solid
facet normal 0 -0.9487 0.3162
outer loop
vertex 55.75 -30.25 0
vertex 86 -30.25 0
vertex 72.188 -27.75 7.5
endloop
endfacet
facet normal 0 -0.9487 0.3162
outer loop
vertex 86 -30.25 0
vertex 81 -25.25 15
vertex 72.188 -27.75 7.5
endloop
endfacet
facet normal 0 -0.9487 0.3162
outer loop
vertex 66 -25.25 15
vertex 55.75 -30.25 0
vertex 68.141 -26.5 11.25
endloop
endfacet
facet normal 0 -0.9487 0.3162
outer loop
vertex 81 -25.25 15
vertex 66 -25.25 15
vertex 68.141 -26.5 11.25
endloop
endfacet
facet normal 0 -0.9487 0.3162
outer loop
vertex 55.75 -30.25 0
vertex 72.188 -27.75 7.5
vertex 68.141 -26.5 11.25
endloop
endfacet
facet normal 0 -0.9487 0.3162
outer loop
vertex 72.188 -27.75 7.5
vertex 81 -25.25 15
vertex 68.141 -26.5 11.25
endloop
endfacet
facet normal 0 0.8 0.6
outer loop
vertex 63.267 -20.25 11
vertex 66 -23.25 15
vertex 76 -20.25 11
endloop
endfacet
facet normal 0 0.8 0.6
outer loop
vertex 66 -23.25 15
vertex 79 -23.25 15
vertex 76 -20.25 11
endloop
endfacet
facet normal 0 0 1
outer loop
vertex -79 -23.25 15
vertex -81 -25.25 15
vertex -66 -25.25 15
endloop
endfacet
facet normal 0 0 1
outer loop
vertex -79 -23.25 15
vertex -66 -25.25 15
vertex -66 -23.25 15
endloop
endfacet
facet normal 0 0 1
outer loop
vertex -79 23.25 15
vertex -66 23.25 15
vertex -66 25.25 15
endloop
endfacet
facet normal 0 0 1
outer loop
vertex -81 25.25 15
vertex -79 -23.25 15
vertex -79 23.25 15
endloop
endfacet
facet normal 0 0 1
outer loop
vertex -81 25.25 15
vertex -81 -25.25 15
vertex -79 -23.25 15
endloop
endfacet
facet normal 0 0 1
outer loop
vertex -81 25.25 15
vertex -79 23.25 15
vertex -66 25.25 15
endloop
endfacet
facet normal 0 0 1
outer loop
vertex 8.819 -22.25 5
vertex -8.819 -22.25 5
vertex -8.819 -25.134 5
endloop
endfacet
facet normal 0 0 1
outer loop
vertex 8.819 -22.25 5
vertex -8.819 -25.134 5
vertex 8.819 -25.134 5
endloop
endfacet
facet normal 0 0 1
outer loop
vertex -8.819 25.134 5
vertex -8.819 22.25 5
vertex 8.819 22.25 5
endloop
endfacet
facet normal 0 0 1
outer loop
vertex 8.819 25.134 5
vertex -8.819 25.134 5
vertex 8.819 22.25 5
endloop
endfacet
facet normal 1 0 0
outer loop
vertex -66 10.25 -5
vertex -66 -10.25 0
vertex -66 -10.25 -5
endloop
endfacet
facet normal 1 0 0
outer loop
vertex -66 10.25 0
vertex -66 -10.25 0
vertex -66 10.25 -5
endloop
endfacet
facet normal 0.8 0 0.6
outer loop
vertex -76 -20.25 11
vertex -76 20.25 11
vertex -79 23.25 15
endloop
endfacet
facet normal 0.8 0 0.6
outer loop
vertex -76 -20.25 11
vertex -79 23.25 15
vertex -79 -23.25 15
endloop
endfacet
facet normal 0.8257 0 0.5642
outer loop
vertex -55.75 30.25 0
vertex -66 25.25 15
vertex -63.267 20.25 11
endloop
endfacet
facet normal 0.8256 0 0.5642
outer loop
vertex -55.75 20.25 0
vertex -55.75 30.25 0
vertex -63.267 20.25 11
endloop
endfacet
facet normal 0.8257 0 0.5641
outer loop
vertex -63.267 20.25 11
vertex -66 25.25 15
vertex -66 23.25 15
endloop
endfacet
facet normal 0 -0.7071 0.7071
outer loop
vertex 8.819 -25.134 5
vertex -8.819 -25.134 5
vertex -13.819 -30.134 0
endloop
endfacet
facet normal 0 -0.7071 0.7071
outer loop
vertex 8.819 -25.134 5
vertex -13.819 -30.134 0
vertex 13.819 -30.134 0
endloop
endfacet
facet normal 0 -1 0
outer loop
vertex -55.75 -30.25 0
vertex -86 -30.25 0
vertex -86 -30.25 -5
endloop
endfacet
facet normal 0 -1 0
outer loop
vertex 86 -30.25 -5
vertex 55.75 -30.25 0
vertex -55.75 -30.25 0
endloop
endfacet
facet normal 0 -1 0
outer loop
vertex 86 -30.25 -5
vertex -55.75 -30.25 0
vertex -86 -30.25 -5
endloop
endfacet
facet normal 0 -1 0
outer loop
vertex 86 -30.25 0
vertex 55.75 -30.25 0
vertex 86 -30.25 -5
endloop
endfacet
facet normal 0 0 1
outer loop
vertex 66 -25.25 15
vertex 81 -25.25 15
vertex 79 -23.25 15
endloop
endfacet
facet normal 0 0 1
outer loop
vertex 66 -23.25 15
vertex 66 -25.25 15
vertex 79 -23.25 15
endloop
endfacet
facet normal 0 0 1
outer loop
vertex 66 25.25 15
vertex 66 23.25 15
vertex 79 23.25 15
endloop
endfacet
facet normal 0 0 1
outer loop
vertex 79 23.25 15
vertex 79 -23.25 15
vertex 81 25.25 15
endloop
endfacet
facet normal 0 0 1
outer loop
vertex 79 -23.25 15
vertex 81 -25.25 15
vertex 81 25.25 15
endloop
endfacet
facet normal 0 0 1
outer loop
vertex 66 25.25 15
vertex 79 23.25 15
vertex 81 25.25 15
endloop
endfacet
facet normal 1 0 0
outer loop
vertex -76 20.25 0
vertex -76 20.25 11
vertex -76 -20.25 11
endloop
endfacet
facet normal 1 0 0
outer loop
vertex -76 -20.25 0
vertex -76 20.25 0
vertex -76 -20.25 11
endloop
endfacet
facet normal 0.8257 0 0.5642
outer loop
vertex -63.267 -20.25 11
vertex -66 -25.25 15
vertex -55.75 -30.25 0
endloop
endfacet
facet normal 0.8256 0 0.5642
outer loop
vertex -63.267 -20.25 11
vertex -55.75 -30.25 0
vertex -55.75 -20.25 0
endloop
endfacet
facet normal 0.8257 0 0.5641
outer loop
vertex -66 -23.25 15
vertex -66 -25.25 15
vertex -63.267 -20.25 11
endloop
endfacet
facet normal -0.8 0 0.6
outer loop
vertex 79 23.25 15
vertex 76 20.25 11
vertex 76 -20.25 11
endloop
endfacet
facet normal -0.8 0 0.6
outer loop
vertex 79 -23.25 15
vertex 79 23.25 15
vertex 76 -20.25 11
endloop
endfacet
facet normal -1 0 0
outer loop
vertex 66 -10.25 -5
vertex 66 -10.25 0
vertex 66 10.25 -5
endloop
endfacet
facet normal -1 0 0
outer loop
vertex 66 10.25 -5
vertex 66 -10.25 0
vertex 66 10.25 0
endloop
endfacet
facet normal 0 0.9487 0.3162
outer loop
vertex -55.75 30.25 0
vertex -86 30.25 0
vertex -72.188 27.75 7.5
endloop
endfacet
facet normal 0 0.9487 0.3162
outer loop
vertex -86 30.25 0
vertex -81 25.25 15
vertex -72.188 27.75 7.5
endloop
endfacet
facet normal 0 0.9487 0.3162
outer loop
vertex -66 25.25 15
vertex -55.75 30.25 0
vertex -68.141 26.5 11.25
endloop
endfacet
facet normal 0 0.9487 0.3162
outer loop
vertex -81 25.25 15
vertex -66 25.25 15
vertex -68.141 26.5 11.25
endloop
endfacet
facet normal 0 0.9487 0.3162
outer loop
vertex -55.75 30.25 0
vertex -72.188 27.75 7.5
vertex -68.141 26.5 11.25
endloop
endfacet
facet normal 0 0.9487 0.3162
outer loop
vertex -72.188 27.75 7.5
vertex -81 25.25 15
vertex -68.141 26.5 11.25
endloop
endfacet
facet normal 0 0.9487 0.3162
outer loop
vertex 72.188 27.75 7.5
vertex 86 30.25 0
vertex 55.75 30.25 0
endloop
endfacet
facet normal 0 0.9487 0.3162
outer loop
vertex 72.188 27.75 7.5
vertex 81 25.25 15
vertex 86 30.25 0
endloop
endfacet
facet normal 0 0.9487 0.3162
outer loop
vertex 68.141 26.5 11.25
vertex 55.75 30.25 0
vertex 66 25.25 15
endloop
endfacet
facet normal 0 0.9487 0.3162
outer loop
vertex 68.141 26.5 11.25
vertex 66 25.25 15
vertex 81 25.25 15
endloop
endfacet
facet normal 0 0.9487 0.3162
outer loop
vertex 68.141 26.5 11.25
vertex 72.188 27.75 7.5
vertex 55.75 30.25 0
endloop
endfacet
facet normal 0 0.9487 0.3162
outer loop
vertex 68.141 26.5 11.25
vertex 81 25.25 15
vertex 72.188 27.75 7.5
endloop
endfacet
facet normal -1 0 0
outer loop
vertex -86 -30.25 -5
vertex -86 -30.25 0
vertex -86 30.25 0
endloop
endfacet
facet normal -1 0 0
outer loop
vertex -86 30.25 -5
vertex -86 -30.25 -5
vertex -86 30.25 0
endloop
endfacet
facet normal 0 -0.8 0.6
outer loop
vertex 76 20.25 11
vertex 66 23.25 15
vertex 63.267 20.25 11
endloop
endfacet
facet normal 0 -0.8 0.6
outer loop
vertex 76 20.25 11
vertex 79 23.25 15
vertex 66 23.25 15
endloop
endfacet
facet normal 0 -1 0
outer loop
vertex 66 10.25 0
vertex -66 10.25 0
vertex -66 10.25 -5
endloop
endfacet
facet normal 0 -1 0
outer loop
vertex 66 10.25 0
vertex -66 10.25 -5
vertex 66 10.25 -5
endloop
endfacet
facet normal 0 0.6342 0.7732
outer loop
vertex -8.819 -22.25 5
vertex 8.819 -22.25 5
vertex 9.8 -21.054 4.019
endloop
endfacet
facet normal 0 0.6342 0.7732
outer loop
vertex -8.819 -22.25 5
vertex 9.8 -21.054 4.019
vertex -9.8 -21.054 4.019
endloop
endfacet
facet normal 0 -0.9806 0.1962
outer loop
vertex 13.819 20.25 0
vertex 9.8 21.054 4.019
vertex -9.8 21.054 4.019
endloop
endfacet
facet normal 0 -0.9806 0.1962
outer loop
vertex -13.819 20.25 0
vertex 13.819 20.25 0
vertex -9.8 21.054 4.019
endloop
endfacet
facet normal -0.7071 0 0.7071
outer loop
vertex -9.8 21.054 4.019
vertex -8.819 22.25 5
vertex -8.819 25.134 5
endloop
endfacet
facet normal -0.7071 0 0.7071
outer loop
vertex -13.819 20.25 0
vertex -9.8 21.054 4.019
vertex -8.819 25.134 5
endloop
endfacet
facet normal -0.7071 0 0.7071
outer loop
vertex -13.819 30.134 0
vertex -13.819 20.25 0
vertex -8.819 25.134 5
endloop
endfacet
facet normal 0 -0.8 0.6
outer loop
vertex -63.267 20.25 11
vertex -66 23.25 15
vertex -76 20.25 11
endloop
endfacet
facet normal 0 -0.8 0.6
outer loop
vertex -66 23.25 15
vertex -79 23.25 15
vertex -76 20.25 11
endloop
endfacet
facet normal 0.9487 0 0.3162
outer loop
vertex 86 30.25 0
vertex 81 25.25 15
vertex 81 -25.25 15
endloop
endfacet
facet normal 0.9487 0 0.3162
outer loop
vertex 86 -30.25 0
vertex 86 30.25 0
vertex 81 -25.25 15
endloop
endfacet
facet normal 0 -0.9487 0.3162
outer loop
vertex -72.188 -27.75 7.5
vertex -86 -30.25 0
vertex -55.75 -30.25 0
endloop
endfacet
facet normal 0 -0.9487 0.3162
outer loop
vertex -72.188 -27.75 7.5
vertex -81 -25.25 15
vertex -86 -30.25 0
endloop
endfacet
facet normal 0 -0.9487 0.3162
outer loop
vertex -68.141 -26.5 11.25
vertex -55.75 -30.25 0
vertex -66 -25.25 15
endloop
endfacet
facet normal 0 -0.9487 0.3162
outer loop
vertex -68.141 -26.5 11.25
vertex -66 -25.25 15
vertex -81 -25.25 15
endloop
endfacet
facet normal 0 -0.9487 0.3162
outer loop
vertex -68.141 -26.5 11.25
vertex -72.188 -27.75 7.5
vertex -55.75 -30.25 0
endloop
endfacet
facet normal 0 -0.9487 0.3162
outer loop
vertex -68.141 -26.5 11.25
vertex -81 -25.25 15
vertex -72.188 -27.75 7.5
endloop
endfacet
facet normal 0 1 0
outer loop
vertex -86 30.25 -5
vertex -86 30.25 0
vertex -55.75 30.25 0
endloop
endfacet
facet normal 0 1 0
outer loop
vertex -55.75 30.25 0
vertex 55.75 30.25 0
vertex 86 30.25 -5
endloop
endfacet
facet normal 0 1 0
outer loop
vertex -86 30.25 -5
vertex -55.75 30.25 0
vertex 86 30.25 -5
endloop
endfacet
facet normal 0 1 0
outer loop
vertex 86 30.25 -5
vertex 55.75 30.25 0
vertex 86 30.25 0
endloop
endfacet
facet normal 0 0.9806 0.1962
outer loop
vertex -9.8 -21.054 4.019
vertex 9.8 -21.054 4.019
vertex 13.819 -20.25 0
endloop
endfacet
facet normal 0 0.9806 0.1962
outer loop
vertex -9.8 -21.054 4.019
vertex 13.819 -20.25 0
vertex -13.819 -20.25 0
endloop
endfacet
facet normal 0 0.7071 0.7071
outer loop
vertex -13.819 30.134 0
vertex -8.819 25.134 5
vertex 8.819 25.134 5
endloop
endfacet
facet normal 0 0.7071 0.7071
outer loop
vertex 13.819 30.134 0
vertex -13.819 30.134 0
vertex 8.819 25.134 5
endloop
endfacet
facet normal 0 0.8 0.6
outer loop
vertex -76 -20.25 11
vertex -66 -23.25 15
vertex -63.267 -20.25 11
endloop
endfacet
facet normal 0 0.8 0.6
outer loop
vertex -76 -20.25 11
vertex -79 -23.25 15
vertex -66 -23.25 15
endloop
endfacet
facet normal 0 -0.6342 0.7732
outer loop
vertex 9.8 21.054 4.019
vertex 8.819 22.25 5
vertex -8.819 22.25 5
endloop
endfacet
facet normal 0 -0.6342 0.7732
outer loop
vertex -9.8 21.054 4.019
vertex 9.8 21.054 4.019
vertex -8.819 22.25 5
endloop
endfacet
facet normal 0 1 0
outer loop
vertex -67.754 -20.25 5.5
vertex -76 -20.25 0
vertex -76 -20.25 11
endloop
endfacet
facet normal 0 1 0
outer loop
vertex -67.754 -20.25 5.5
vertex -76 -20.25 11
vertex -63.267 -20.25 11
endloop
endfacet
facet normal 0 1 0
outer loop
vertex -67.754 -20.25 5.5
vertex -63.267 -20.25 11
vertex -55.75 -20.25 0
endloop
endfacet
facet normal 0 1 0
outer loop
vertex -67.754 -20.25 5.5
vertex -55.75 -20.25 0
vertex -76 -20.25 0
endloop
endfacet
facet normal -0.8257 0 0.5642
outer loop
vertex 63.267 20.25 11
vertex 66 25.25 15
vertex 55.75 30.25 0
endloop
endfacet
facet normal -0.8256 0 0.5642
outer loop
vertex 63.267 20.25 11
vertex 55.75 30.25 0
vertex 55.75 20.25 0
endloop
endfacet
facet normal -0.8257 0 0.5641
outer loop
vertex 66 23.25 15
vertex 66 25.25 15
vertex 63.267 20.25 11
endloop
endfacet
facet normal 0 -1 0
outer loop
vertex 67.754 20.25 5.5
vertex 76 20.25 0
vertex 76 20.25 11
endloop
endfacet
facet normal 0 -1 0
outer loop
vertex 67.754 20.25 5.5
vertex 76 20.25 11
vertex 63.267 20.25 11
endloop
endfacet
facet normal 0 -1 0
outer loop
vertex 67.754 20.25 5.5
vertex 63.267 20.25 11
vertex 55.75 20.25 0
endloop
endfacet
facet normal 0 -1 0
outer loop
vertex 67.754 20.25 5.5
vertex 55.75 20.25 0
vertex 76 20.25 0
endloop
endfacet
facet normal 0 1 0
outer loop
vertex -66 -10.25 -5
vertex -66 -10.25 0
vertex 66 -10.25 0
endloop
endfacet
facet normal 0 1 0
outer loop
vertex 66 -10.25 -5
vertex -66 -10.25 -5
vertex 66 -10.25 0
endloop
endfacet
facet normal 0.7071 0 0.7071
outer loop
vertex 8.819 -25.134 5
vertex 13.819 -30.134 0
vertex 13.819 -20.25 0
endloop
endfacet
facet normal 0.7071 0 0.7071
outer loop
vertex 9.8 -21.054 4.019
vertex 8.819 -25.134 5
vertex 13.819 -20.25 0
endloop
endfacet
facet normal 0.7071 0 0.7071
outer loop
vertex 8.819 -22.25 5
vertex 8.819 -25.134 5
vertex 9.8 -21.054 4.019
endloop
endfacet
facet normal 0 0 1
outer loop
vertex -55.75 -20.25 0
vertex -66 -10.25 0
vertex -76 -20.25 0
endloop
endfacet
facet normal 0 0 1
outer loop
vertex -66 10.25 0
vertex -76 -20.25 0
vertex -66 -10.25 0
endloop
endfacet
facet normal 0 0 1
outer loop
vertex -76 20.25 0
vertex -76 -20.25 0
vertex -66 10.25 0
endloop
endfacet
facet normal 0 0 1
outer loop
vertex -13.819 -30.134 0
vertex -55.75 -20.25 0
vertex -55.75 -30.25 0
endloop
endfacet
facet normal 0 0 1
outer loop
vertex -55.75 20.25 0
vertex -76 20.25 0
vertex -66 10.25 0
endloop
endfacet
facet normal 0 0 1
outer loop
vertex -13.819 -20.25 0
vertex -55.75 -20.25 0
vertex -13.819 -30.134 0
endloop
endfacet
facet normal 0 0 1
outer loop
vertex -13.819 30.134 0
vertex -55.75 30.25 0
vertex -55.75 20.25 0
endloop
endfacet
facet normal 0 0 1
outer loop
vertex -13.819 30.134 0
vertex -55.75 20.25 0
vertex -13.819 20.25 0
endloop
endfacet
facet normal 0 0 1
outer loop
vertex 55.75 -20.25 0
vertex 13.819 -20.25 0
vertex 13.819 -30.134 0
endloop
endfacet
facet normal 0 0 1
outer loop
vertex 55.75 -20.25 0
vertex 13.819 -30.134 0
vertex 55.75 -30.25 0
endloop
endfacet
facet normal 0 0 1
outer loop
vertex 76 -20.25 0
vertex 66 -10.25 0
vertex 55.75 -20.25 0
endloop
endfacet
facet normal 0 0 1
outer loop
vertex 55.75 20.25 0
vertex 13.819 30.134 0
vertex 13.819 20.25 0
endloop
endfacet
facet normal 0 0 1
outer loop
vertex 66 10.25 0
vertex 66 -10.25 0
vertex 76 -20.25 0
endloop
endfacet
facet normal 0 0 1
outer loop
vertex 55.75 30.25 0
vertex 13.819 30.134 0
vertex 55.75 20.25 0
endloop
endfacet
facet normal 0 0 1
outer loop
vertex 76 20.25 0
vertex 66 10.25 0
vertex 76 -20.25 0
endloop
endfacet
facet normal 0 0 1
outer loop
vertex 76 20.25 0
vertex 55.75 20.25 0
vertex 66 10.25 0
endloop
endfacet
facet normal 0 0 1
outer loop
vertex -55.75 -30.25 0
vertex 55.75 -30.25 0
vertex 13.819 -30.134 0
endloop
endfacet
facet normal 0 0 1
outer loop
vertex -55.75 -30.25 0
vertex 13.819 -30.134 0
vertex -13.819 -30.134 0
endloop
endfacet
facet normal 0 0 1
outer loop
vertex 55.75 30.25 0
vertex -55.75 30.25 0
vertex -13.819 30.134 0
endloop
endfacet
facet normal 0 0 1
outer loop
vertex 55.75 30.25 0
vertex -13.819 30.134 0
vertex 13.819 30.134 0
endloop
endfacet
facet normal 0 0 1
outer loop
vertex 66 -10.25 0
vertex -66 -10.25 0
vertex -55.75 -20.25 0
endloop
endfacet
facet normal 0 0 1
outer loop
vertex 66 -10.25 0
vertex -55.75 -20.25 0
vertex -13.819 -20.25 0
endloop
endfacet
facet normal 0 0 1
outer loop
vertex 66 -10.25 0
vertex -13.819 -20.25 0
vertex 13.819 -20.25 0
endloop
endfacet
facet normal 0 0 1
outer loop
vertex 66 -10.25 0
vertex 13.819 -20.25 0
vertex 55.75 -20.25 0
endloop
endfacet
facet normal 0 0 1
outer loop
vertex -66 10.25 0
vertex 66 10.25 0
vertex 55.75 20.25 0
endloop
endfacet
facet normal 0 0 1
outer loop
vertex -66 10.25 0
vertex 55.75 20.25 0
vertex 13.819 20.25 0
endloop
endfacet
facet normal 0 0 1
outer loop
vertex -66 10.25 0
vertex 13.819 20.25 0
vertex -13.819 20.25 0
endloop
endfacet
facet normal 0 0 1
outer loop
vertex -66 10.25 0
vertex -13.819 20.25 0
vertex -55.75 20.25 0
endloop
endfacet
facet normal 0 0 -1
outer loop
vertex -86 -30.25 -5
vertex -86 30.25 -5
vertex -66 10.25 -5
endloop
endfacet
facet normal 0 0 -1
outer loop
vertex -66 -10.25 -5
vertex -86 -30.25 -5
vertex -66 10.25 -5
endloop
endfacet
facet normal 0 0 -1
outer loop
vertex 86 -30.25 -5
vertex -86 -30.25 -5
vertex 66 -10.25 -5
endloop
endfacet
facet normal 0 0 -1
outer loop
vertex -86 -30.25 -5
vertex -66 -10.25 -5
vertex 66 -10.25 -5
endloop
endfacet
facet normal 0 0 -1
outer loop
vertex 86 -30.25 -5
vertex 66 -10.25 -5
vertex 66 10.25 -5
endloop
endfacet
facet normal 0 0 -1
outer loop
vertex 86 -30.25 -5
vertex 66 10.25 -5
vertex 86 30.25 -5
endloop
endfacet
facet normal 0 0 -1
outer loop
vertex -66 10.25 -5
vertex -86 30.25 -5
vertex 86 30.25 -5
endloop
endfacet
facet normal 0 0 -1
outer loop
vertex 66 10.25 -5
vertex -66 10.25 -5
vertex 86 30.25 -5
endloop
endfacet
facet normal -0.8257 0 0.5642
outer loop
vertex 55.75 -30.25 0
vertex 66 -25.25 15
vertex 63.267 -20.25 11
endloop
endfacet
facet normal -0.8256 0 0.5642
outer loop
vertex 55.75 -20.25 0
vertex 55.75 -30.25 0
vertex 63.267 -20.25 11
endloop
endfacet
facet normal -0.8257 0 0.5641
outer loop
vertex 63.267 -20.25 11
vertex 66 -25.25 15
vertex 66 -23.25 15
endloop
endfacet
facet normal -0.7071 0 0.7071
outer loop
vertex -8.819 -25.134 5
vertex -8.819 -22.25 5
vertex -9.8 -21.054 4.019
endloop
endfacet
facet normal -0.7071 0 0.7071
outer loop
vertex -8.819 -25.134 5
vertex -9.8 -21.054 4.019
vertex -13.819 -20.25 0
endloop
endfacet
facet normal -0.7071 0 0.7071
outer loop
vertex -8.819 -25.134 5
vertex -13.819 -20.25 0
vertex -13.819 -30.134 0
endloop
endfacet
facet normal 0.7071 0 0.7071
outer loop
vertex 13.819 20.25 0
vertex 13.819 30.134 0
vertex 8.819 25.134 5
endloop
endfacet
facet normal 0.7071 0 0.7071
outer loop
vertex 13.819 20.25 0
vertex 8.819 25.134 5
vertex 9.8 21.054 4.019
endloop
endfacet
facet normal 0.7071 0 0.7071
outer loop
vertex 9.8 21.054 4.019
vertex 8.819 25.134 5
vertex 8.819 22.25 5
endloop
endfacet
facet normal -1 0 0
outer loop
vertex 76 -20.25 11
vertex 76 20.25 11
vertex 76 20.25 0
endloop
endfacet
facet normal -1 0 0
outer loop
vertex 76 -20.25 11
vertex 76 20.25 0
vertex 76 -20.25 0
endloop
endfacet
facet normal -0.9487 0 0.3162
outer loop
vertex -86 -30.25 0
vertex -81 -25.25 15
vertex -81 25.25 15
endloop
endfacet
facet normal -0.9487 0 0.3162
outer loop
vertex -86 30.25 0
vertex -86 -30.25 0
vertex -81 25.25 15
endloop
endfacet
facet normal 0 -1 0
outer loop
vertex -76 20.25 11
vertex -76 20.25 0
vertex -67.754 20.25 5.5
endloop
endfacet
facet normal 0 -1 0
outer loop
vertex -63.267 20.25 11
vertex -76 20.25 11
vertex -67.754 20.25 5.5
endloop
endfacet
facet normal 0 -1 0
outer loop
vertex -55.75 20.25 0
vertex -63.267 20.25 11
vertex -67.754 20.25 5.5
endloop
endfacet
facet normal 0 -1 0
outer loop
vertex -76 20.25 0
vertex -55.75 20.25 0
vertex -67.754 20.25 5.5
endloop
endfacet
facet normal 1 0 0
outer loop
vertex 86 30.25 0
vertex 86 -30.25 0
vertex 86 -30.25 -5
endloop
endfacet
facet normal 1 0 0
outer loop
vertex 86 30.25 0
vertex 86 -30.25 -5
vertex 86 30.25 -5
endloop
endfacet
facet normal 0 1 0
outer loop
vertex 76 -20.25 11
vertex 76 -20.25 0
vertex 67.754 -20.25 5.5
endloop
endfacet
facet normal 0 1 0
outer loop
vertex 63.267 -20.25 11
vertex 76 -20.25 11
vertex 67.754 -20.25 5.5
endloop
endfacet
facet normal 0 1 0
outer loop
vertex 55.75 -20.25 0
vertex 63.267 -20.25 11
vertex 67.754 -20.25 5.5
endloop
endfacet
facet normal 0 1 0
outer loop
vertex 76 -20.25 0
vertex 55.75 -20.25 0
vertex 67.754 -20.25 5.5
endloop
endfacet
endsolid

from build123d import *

# Parameters (mm, degrees)
F0_W      = 172
F0_H      = 60.5
F4_DEPTH  = 5
F6_SIZE2  = 4
F6_SIZE   = 3
F9_DEPTH  = 5
F10_SIZE  = 4.99999
F11_SIZE2 = 0.99999
F11_SIZE  = 4.99999
F12_SIZE  = 1
F14_W     = 132
F14_H     = 20.5
F15_DEPTH = 12.5


# Not quite as in the source:
# - a fillet or chamfer is up to 0.001 mm smaller than in the source, because OpenCascade refuses the exact size


with BuildPart() as f4:
    # F0 (on Top) → F4 (new body)
    with BuildSketch(Plane.XY):
        Rectangle(F0_W, F0_H)
    extrude(amount=-F4_DEPTH)

    # F3 (on Top) → F5 section 0
    with BuildSketch(Plane.XY):
        Polygon((-86, 0), (-86, -30.25), (-55.75, -30.25), (-55.75, -20.25), (-76, -20.25), (-76, 0), align=None)
    # F2 (on offset) → F5 section 1
    with BuildSketch(Plane.XY.offset(15)):
        Polygon((-76, -20.25), (-76, 0), (-81, 0), (-81, -25.25), (-66, -25.25), (-66, -20.25), align=None)
    loft()

    # F6
    f6_edges = [f4.edges().sort_by_distance(p)[0] for p in [
        (-76, -10.125, 15),
        (-71, -20.25, 15),
    ]]
    chamfer(f6_edges, length=F6_SIZE, length2=F6_SIZE2)

    # F7: F4 across plane


with BuildPart() as f4_1:
    add(f4.part)
    add(f4.part.mirror(Plane.YZ))

    # F8 (on face) → F9 (join)
    with BuildSketch(Plane.XY):
        Polygon((13.8189587742, -20.25), (0, -20.25), (-13.8189587742, -20.25), (-13.8189587742, -30.1344580948), (0, -30.1344580948), (13.8189587742, -30.1344580948), align=None)
    extrude(amount=F9_DEPTH)

    # F10 (size 5 in the source; OpenCascade refuses exactly that, so slightly less here)
    f10_edges = [f4_1.edges().sort_by_distance(p)[0] for p in [
        (13.818959, -25.192229, 5),
        (0, -30.134458, 5),
        (-13.818959, -25.192229, 5),
    ]]
    chamfer(f10_edges, length=F10_SIZE)

    # F11 (size 5 and 1 in the source; OpenCascade refuses exactly that, so slightly less here)
    f11_edges = [f4_1.edges().sort_by_distance(p)[0] for p in [
        (0, -20.25, 5),
    ]]
    f11_side = f4_1.faces().sort_by_distance((0, -20.25, 2.315943))[0]
    chamfer(f11_edges, length=F11_SIZE, length2=F11_SIZE2, reference=f11_side)

    # F12
    f12_edges = [f4_1.edges().sort_by_distance(p)[0] for p in [
        (0, -21.24999, 5),
    ]]
    chamfer(f12_edges, length=F12_SIZE)

    # F13: F4 across plane


with BuildPart() as f4_2:
    add(f4_1.part)
    add(f4_1.part.mirror(Plane.XZ))

    # F14 (on Top) → F15 (cut, symmetric)
    with BuildSketch(Plane.XY):
        Rectangle(F14_W, F14_H)
    extrude(amount=F15_DEPTH, both=True, mode=Mode.SUBTRACT)


solid = f4_2.part
